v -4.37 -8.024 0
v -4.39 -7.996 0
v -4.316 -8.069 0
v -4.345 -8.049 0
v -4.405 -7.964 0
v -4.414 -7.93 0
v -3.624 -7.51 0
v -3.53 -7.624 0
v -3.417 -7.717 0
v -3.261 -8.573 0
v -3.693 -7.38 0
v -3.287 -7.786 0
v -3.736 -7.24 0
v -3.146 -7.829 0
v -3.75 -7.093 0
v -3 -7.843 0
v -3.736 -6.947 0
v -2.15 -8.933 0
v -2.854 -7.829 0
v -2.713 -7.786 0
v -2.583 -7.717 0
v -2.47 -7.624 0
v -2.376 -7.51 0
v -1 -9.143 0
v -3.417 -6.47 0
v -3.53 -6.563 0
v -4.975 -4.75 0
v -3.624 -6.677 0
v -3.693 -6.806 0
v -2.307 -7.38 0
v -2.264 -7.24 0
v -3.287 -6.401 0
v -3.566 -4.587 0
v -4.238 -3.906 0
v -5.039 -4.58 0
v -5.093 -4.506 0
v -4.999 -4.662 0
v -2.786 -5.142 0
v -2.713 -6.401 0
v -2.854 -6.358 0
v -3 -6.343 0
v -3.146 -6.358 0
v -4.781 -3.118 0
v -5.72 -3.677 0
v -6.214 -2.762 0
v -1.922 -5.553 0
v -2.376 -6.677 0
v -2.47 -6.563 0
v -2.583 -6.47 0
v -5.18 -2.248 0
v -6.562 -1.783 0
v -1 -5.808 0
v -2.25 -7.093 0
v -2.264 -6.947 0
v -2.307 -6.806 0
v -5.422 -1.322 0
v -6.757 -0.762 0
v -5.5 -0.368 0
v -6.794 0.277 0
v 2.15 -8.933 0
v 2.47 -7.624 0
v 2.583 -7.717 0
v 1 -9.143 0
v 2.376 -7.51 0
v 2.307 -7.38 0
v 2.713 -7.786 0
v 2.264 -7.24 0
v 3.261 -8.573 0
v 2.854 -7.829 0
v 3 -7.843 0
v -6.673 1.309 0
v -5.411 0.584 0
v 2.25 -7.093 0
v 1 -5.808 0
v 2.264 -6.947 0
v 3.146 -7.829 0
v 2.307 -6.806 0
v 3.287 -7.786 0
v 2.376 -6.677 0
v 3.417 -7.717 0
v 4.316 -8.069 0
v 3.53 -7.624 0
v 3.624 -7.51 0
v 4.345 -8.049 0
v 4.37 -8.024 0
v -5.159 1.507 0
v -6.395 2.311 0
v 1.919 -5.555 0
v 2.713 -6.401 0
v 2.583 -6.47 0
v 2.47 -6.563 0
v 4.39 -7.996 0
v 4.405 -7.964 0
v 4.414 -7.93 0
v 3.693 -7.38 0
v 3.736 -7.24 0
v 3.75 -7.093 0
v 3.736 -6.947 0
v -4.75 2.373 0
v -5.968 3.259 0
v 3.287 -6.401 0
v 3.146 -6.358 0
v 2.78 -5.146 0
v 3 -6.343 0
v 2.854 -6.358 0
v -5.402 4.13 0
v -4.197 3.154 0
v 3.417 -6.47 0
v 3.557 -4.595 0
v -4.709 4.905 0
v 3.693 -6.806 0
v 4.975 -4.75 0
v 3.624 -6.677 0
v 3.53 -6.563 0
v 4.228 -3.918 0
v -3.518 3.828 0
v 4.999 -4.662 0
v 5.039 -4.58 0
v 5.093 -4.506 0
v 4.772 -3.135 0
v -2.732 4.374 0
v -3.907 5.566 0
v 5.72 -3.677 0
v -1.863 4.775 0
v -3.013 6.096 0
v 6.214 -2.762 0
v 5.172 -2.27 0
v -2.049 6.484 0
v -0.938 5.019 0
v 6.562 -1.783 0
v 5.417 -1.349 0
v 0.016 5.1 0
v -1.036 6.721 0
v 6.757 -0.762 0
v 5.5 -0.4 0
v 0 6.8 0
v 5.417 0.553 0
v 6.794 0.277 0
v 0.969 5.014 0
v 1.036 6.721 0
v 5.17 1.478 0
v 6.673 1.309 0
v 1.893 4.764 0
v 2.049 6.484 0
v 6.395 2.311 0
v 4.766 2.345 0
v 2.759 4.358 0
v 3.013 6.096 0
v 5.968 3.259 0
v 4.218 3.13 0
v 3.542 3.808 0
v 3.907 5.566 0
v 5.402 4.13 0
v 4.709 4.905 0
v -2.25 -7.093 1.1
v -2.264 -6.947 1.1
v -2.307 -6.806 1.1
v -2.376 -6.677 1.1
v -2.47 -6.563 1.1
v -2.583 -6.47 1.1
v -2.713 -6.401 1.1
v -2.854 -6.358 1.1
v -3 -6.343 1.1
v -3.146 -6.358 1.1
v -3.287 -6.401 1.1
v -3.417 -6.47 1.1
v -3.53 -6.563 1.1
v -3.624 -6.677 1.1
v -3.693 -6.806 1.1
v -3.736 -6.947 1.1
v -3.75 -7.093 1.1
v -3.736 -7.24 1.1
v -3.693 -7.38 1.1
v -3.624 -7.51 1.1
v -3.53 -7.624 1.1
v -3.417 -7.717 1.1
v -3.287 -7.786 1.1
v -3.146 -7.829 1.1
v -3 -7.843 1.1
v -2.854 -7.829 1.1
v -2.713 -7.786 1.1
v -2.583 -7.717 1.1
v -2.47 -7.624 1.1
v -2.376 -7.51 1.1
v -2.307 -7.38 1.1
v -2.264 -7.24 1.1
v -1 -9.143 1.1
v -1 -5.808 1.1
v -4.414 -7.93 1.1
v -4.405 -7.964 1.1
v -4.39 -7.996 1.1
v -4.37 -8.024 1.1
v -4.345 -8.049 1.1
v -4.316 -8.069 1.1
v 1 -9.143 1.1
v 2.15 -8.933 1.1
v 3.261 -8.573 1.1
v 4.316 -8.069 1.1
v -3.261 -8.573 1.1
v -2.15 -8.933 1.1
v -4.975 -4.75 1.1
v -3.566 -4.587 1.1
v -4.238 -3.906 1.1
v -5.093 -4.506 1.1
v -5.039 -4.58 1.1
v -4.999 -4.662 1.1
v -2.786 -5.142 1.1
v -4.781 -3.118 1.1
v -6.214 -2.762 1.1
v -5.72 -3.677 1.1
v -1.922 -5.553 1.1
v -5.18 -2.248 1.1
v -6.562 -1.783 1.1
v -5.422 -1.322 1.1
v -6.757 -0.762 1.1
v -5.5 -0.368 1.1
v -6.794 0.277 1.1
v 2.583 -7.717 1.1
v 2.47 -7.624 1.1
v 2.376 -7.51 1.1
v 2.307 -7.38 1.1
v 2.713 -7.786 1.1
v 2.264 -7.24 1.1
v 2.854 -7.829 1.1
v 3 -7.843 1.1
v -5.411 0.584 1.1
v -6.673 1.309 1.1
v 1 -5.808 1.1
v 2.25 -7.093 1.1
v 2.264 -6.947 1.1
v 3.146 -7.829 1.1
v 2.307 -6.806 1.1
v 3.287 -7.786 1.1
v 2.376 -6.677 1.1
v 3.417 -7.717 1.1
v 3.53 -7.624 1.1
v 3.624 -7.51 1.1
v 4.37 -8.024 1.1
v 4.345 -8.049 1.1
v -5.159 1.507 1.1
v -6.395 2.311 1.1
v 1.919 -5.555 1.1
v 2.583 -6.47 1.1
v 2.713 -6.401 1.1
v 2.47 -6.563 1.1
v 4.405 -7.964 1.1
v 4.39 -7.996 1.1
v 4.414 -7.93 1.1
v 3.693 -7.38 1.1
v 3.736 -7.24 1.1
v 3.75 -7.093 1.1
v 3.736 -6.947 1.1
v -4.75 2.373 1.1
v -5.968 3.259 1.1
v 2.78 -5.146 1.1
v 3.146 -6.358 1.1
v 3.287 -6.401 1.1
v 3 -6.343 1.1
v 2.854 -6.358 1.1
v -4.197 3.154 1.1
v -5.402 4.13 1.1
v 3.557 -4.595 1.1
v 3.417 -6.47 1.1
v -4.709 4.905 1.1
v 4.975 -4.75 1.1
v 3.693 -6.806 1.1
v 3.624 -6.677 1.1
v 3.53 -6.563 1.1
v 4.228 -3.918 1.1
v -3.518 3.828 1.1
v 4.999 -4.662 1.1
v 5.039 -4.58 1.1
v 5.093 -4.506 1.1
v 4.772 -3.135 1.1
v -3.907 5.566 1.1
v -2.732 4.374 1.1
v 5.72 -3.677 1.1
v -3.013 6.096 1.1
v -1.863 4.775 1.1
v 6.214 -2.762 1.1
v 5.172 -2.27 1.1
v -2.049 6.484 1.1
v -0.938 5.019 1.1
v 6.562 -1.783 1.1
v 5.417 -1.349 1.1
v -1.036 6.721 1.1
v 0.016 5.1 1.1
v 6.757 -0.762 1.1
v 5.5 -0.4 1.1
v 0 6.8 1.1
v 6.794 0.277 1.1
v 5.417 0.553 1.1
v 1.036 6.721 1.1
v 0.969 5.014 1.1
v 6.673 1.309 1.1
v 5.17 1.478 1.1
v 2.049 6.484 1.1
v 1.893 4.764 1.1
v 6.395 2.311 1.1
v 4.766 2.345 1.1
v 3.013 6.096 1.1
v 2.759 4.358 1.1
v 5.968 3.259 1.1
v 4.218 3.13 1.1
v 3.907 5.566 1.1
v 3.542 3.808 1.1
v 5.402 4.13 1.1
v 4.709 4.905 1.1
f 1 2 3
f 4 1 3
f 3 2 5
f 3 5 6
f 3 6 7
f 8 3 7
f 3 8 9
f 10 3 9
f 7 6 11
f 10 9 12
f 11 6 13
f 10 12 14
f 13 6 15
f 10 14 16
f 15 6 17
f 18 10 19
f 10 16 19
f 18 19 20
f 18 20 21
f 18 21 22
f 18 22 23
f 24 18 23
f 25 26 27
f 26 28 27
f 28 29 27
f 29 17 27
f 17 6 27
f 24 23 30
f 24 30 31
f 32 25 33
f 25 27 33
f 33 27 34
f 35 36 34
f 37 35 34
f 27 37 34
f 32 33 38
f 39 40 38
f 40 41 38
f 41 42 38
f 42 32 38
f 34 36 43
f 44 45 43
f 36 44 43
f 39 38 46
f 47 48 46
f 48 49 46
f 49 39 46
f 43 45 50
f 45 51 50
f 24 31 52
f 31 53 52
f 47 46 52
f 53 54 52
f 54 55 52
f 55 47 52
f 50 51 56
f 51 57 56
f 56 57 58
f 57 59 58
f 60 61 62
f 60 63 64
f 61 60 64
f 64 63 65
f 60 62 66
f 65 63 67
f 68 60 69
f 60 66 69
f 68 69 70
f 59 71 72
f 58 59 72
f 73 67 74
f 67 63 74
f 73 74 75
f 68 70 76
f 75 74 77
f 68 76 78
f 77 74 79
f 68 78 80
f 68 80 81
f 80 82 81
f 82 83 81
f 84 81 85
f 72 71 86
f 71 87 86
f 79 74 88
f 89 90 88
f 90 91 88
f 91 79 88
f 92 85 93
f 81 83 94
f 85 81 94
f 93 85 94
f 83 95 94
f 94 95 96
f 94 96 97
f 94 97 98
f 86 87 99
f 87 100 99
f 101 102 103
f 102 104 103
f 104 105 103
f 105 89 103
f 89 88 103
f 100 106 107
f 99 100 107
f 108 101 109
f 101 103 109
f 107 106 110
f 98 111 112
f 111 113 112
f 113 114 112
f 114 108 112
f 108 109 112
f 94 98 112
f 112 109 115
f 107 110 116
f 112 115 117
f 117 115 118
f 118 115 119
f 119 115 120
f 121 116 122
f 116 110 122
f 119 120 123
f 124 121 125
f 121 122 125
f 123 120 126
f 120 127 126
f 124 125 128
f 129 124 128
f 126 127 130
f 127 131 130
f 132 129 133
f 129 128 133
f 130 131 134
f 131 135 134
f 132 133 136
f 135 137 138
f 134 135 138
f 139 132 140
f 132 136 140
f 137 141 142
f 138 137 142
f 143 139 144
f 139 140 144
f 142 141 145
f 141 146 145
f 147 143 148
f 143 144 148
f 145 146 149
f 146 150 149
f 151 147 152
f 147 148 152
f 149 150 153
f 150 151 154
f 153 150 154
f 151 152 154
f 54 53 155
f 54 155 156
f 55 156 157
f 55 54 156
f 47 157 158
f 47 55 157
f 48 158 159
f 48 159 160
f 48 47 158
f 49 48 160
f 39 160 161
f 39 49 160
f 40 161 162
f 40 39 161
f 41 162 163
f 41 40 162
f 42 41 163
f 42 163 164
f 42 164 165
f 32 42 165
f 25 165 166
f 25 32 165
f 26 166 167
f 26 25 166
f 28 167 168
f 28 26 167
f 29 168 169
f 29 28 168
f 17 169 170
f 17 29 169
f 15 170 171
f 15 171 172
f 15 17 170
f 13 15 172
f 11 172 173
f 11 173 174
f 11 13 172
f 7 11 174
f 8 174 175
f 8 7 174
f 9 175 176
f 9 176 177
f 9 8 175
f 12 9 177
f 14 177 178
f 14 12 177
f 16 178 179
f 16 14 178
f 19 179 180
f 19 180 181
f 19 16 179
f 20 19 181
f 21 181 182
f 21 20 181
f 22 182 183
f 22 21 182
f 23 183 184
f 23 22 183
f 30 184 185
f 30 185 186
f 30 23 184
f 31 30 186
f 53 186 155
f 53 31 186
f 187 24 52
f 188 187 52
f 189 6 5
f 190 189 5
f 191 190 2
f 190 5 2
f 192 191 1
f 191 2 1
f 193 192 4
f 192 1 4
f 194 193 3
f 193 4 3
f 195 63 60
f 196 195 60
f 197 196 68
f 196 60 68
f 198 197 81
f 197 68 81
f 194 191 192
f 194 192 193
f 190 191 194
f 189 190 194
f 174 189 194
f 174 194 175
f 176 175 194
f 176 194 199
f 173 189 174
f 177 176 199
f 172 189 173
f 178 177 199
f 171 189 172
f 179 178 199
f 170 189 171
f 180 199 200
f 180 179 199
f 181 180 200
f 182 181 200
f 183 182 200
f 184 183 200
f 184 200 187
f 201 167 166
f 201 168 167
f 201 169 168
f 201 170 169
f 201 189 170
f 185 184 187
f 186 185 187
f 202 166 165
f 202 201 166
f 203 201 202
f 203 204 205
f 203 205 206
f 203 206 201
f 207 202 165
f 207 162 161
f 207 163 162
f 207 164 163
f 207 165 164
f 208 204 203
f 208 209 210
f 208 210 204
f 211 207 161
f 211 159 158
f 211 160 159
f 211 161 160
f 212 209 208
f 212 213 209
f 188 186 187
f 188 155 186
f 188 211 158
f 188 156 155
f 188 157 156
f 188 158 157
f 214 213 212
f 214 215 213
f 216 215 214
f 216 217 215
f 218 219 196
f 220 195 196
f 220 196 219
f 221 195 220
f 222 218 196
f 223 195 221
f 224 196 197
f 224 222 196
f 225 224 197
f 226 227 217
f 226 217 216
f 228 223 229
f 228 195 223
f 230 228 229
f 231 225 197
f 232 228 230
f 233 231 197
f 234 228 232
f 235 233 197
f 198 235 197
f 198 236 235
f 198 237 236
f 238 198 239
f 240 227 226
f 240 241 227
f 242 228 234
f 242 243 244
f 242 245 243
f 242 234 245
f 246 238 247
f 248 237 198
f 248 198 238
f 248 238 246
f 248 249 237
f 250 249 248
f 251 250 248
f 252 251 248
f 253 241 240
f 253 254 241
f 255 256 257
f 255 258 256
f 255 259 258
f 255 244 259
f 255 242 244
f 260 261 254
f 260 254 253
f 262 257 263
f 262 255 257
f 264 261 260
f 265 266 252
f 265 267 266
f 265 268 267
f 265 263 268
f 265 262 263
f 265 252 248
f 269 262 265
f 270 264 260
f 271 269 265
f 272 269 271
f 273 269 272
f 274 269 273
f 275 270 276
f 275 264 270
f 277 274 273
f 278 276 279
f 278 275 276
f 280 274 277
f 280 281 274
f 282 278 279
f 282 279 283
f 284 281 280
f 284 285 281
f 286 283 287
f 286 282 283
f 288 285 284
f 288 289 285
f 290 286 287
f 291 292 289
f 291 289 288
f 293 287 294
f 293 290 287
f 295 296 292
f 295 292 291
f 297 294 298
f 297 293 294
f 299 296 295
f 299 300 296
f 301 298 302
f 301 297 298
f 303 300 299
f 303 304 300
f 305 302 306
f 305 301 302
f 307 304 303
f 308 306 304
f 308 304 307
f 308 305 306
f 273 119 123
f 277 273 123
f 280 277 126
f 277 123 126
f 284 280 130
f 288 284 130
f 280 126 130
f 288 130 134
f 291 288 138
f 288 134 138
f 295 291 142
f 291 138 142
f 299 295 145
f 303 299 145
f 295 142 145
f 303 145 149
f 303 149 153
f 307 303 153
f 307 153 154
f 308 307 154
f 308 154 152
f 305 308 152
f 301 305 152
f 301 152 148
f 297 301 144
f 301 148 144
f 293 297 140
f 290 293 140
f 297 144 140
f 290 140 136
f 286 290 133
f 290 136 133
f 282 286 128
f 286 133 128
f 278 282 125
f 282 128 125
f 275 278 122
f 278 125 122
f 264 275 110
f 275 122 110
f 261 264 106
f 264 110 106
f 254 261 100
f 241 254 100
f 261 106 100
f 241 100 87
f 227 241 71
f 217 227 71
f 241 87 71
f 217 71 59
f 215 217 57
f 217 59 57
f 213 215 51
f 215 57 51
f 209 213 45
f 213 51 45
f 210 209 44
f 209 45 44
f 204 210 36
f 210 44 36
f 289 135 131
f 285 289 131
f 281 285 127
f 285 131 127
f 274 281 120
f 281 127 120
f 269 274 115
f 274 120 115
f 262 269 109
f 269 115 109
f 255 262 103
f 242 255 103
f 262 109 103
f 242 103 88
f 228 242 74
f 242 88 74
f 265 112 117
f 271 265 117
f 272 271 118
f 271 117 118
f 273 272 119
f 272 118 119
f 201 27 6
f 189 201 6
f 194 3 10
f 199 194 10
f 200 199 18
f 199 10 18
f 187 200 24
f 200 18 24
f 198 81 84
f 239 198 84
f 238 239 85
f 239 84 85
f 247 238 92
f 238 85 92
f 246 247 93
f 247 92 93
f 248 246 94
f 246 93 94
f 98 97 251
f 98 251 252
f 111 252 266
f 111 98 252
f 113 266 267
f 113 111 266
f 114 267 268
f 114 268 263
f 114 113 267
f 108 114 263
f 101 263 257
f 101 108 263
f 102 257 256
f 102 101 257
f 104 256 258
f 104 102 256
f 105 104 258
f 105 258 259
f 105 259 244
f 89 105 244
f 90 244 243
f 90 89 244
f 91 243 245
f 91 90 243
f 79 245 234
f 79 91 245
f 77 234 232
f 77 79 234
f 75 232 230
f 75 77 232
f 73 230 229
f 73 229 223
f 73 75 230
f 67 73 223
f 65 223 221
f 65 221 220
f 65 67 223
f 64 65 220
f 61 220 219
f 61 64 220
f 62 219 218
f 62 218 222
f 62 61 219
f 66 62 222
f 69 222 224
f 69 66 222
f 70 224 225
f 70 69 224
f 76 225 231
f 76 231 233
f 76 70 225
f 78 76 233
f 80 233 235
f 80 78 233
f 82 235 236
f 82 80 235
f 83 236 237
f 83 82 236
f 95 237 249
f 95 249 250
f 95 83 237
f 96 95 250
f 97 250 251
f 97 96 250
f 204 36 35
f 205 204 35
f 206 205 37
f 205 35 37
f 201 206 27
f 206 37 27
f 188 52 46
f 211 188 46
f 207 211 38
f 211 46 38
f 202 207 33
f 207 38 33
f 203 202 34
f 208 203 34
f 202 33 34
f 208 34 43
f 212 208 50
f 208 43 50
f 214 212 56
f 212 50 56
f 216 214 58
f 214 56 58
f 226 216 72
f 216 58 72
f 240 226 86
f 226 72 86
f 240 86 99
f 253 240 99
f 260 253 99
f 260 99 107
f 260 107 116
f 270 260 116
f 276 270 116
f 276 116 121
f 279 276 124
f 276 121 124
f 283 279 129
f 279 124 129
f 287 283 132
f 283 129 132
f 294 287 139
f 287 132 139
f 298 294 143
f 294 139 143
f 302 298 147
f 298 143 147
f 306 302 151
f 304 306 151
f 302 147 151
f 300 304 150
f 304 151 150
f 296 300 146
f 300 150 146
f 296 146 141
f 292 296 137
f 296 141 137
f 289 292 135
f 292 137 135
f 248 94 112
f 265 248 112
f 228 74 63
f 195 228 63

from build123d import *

# Parameters (mm, degrees)
SKETCH_1_R      = 0.75
EXTRUDE_1_DEPTH = 1.1


with BuildPart() as part:
    # 草图1 → 凸台-拉伸1 (new body)
    with BuildSketch(Plane.XY):
        with BuildLine():
            Line((-1, -9.142997198), (-1, -5.808326913))
            ThreePointArc((-1, -5.808326913), (-3.51781182, 3.827883631), (5.5, -0.4))
            ThreePointArc((5.5, -0.4), (4.227883631, -3.91781182), (1, -5.808326913))
            Line((1, -5.808326913), (1, -9.142997198))
            ThreePointArc((1, -9.142997198), (2.711468806, -8.771853852), (4.315554735, -8.069158189))
            ThreePointArc((4.315554735, -8.069158189), (4.380668311, -8.010477473), (4.414435496, -7.929588775))
            Line((4.414435496, -7.929588775), (4.975043576, -4.75022236))
            ThreePointArc((4.975043576, -4.75022236), (5.017096746, -4.619827111), (5.092964751, -4.505741898))
            ThreePointArc((5.092964751, -4.505741898), (0, 6.8), (-5.092964751, -4.505741898))
            ThreePointArc((-5.092964751, -4.505741898), (-5.017096746, -4.619827111), (-4.975043576, -4.75022236))
            Line((-4.975043576, -4.75022236), (-4.414435496, -7.929588775))
            ThreePointArc((-4.414435496, -7.929588775), (-4.380668311, -8.010477473), (-4.315554735, -8.069158189))
            ThreePointArc((-4.315554735, -8.069158189), (-2.711468806, -8.771853852), (-1, -9.142997198))
        make_face()
        with Locations((-3, -7.093477568)):
            Circle(SKETCH_1_R, mode=Mode.SUBTRACT)
        with Locations((3, -7.093477568)):
            Circle(SKETCH_1_R, mode=Mode.SUBTRACT)
    extrude(amount=EXTRUDE_1_DEPTH)


solid = part.part
